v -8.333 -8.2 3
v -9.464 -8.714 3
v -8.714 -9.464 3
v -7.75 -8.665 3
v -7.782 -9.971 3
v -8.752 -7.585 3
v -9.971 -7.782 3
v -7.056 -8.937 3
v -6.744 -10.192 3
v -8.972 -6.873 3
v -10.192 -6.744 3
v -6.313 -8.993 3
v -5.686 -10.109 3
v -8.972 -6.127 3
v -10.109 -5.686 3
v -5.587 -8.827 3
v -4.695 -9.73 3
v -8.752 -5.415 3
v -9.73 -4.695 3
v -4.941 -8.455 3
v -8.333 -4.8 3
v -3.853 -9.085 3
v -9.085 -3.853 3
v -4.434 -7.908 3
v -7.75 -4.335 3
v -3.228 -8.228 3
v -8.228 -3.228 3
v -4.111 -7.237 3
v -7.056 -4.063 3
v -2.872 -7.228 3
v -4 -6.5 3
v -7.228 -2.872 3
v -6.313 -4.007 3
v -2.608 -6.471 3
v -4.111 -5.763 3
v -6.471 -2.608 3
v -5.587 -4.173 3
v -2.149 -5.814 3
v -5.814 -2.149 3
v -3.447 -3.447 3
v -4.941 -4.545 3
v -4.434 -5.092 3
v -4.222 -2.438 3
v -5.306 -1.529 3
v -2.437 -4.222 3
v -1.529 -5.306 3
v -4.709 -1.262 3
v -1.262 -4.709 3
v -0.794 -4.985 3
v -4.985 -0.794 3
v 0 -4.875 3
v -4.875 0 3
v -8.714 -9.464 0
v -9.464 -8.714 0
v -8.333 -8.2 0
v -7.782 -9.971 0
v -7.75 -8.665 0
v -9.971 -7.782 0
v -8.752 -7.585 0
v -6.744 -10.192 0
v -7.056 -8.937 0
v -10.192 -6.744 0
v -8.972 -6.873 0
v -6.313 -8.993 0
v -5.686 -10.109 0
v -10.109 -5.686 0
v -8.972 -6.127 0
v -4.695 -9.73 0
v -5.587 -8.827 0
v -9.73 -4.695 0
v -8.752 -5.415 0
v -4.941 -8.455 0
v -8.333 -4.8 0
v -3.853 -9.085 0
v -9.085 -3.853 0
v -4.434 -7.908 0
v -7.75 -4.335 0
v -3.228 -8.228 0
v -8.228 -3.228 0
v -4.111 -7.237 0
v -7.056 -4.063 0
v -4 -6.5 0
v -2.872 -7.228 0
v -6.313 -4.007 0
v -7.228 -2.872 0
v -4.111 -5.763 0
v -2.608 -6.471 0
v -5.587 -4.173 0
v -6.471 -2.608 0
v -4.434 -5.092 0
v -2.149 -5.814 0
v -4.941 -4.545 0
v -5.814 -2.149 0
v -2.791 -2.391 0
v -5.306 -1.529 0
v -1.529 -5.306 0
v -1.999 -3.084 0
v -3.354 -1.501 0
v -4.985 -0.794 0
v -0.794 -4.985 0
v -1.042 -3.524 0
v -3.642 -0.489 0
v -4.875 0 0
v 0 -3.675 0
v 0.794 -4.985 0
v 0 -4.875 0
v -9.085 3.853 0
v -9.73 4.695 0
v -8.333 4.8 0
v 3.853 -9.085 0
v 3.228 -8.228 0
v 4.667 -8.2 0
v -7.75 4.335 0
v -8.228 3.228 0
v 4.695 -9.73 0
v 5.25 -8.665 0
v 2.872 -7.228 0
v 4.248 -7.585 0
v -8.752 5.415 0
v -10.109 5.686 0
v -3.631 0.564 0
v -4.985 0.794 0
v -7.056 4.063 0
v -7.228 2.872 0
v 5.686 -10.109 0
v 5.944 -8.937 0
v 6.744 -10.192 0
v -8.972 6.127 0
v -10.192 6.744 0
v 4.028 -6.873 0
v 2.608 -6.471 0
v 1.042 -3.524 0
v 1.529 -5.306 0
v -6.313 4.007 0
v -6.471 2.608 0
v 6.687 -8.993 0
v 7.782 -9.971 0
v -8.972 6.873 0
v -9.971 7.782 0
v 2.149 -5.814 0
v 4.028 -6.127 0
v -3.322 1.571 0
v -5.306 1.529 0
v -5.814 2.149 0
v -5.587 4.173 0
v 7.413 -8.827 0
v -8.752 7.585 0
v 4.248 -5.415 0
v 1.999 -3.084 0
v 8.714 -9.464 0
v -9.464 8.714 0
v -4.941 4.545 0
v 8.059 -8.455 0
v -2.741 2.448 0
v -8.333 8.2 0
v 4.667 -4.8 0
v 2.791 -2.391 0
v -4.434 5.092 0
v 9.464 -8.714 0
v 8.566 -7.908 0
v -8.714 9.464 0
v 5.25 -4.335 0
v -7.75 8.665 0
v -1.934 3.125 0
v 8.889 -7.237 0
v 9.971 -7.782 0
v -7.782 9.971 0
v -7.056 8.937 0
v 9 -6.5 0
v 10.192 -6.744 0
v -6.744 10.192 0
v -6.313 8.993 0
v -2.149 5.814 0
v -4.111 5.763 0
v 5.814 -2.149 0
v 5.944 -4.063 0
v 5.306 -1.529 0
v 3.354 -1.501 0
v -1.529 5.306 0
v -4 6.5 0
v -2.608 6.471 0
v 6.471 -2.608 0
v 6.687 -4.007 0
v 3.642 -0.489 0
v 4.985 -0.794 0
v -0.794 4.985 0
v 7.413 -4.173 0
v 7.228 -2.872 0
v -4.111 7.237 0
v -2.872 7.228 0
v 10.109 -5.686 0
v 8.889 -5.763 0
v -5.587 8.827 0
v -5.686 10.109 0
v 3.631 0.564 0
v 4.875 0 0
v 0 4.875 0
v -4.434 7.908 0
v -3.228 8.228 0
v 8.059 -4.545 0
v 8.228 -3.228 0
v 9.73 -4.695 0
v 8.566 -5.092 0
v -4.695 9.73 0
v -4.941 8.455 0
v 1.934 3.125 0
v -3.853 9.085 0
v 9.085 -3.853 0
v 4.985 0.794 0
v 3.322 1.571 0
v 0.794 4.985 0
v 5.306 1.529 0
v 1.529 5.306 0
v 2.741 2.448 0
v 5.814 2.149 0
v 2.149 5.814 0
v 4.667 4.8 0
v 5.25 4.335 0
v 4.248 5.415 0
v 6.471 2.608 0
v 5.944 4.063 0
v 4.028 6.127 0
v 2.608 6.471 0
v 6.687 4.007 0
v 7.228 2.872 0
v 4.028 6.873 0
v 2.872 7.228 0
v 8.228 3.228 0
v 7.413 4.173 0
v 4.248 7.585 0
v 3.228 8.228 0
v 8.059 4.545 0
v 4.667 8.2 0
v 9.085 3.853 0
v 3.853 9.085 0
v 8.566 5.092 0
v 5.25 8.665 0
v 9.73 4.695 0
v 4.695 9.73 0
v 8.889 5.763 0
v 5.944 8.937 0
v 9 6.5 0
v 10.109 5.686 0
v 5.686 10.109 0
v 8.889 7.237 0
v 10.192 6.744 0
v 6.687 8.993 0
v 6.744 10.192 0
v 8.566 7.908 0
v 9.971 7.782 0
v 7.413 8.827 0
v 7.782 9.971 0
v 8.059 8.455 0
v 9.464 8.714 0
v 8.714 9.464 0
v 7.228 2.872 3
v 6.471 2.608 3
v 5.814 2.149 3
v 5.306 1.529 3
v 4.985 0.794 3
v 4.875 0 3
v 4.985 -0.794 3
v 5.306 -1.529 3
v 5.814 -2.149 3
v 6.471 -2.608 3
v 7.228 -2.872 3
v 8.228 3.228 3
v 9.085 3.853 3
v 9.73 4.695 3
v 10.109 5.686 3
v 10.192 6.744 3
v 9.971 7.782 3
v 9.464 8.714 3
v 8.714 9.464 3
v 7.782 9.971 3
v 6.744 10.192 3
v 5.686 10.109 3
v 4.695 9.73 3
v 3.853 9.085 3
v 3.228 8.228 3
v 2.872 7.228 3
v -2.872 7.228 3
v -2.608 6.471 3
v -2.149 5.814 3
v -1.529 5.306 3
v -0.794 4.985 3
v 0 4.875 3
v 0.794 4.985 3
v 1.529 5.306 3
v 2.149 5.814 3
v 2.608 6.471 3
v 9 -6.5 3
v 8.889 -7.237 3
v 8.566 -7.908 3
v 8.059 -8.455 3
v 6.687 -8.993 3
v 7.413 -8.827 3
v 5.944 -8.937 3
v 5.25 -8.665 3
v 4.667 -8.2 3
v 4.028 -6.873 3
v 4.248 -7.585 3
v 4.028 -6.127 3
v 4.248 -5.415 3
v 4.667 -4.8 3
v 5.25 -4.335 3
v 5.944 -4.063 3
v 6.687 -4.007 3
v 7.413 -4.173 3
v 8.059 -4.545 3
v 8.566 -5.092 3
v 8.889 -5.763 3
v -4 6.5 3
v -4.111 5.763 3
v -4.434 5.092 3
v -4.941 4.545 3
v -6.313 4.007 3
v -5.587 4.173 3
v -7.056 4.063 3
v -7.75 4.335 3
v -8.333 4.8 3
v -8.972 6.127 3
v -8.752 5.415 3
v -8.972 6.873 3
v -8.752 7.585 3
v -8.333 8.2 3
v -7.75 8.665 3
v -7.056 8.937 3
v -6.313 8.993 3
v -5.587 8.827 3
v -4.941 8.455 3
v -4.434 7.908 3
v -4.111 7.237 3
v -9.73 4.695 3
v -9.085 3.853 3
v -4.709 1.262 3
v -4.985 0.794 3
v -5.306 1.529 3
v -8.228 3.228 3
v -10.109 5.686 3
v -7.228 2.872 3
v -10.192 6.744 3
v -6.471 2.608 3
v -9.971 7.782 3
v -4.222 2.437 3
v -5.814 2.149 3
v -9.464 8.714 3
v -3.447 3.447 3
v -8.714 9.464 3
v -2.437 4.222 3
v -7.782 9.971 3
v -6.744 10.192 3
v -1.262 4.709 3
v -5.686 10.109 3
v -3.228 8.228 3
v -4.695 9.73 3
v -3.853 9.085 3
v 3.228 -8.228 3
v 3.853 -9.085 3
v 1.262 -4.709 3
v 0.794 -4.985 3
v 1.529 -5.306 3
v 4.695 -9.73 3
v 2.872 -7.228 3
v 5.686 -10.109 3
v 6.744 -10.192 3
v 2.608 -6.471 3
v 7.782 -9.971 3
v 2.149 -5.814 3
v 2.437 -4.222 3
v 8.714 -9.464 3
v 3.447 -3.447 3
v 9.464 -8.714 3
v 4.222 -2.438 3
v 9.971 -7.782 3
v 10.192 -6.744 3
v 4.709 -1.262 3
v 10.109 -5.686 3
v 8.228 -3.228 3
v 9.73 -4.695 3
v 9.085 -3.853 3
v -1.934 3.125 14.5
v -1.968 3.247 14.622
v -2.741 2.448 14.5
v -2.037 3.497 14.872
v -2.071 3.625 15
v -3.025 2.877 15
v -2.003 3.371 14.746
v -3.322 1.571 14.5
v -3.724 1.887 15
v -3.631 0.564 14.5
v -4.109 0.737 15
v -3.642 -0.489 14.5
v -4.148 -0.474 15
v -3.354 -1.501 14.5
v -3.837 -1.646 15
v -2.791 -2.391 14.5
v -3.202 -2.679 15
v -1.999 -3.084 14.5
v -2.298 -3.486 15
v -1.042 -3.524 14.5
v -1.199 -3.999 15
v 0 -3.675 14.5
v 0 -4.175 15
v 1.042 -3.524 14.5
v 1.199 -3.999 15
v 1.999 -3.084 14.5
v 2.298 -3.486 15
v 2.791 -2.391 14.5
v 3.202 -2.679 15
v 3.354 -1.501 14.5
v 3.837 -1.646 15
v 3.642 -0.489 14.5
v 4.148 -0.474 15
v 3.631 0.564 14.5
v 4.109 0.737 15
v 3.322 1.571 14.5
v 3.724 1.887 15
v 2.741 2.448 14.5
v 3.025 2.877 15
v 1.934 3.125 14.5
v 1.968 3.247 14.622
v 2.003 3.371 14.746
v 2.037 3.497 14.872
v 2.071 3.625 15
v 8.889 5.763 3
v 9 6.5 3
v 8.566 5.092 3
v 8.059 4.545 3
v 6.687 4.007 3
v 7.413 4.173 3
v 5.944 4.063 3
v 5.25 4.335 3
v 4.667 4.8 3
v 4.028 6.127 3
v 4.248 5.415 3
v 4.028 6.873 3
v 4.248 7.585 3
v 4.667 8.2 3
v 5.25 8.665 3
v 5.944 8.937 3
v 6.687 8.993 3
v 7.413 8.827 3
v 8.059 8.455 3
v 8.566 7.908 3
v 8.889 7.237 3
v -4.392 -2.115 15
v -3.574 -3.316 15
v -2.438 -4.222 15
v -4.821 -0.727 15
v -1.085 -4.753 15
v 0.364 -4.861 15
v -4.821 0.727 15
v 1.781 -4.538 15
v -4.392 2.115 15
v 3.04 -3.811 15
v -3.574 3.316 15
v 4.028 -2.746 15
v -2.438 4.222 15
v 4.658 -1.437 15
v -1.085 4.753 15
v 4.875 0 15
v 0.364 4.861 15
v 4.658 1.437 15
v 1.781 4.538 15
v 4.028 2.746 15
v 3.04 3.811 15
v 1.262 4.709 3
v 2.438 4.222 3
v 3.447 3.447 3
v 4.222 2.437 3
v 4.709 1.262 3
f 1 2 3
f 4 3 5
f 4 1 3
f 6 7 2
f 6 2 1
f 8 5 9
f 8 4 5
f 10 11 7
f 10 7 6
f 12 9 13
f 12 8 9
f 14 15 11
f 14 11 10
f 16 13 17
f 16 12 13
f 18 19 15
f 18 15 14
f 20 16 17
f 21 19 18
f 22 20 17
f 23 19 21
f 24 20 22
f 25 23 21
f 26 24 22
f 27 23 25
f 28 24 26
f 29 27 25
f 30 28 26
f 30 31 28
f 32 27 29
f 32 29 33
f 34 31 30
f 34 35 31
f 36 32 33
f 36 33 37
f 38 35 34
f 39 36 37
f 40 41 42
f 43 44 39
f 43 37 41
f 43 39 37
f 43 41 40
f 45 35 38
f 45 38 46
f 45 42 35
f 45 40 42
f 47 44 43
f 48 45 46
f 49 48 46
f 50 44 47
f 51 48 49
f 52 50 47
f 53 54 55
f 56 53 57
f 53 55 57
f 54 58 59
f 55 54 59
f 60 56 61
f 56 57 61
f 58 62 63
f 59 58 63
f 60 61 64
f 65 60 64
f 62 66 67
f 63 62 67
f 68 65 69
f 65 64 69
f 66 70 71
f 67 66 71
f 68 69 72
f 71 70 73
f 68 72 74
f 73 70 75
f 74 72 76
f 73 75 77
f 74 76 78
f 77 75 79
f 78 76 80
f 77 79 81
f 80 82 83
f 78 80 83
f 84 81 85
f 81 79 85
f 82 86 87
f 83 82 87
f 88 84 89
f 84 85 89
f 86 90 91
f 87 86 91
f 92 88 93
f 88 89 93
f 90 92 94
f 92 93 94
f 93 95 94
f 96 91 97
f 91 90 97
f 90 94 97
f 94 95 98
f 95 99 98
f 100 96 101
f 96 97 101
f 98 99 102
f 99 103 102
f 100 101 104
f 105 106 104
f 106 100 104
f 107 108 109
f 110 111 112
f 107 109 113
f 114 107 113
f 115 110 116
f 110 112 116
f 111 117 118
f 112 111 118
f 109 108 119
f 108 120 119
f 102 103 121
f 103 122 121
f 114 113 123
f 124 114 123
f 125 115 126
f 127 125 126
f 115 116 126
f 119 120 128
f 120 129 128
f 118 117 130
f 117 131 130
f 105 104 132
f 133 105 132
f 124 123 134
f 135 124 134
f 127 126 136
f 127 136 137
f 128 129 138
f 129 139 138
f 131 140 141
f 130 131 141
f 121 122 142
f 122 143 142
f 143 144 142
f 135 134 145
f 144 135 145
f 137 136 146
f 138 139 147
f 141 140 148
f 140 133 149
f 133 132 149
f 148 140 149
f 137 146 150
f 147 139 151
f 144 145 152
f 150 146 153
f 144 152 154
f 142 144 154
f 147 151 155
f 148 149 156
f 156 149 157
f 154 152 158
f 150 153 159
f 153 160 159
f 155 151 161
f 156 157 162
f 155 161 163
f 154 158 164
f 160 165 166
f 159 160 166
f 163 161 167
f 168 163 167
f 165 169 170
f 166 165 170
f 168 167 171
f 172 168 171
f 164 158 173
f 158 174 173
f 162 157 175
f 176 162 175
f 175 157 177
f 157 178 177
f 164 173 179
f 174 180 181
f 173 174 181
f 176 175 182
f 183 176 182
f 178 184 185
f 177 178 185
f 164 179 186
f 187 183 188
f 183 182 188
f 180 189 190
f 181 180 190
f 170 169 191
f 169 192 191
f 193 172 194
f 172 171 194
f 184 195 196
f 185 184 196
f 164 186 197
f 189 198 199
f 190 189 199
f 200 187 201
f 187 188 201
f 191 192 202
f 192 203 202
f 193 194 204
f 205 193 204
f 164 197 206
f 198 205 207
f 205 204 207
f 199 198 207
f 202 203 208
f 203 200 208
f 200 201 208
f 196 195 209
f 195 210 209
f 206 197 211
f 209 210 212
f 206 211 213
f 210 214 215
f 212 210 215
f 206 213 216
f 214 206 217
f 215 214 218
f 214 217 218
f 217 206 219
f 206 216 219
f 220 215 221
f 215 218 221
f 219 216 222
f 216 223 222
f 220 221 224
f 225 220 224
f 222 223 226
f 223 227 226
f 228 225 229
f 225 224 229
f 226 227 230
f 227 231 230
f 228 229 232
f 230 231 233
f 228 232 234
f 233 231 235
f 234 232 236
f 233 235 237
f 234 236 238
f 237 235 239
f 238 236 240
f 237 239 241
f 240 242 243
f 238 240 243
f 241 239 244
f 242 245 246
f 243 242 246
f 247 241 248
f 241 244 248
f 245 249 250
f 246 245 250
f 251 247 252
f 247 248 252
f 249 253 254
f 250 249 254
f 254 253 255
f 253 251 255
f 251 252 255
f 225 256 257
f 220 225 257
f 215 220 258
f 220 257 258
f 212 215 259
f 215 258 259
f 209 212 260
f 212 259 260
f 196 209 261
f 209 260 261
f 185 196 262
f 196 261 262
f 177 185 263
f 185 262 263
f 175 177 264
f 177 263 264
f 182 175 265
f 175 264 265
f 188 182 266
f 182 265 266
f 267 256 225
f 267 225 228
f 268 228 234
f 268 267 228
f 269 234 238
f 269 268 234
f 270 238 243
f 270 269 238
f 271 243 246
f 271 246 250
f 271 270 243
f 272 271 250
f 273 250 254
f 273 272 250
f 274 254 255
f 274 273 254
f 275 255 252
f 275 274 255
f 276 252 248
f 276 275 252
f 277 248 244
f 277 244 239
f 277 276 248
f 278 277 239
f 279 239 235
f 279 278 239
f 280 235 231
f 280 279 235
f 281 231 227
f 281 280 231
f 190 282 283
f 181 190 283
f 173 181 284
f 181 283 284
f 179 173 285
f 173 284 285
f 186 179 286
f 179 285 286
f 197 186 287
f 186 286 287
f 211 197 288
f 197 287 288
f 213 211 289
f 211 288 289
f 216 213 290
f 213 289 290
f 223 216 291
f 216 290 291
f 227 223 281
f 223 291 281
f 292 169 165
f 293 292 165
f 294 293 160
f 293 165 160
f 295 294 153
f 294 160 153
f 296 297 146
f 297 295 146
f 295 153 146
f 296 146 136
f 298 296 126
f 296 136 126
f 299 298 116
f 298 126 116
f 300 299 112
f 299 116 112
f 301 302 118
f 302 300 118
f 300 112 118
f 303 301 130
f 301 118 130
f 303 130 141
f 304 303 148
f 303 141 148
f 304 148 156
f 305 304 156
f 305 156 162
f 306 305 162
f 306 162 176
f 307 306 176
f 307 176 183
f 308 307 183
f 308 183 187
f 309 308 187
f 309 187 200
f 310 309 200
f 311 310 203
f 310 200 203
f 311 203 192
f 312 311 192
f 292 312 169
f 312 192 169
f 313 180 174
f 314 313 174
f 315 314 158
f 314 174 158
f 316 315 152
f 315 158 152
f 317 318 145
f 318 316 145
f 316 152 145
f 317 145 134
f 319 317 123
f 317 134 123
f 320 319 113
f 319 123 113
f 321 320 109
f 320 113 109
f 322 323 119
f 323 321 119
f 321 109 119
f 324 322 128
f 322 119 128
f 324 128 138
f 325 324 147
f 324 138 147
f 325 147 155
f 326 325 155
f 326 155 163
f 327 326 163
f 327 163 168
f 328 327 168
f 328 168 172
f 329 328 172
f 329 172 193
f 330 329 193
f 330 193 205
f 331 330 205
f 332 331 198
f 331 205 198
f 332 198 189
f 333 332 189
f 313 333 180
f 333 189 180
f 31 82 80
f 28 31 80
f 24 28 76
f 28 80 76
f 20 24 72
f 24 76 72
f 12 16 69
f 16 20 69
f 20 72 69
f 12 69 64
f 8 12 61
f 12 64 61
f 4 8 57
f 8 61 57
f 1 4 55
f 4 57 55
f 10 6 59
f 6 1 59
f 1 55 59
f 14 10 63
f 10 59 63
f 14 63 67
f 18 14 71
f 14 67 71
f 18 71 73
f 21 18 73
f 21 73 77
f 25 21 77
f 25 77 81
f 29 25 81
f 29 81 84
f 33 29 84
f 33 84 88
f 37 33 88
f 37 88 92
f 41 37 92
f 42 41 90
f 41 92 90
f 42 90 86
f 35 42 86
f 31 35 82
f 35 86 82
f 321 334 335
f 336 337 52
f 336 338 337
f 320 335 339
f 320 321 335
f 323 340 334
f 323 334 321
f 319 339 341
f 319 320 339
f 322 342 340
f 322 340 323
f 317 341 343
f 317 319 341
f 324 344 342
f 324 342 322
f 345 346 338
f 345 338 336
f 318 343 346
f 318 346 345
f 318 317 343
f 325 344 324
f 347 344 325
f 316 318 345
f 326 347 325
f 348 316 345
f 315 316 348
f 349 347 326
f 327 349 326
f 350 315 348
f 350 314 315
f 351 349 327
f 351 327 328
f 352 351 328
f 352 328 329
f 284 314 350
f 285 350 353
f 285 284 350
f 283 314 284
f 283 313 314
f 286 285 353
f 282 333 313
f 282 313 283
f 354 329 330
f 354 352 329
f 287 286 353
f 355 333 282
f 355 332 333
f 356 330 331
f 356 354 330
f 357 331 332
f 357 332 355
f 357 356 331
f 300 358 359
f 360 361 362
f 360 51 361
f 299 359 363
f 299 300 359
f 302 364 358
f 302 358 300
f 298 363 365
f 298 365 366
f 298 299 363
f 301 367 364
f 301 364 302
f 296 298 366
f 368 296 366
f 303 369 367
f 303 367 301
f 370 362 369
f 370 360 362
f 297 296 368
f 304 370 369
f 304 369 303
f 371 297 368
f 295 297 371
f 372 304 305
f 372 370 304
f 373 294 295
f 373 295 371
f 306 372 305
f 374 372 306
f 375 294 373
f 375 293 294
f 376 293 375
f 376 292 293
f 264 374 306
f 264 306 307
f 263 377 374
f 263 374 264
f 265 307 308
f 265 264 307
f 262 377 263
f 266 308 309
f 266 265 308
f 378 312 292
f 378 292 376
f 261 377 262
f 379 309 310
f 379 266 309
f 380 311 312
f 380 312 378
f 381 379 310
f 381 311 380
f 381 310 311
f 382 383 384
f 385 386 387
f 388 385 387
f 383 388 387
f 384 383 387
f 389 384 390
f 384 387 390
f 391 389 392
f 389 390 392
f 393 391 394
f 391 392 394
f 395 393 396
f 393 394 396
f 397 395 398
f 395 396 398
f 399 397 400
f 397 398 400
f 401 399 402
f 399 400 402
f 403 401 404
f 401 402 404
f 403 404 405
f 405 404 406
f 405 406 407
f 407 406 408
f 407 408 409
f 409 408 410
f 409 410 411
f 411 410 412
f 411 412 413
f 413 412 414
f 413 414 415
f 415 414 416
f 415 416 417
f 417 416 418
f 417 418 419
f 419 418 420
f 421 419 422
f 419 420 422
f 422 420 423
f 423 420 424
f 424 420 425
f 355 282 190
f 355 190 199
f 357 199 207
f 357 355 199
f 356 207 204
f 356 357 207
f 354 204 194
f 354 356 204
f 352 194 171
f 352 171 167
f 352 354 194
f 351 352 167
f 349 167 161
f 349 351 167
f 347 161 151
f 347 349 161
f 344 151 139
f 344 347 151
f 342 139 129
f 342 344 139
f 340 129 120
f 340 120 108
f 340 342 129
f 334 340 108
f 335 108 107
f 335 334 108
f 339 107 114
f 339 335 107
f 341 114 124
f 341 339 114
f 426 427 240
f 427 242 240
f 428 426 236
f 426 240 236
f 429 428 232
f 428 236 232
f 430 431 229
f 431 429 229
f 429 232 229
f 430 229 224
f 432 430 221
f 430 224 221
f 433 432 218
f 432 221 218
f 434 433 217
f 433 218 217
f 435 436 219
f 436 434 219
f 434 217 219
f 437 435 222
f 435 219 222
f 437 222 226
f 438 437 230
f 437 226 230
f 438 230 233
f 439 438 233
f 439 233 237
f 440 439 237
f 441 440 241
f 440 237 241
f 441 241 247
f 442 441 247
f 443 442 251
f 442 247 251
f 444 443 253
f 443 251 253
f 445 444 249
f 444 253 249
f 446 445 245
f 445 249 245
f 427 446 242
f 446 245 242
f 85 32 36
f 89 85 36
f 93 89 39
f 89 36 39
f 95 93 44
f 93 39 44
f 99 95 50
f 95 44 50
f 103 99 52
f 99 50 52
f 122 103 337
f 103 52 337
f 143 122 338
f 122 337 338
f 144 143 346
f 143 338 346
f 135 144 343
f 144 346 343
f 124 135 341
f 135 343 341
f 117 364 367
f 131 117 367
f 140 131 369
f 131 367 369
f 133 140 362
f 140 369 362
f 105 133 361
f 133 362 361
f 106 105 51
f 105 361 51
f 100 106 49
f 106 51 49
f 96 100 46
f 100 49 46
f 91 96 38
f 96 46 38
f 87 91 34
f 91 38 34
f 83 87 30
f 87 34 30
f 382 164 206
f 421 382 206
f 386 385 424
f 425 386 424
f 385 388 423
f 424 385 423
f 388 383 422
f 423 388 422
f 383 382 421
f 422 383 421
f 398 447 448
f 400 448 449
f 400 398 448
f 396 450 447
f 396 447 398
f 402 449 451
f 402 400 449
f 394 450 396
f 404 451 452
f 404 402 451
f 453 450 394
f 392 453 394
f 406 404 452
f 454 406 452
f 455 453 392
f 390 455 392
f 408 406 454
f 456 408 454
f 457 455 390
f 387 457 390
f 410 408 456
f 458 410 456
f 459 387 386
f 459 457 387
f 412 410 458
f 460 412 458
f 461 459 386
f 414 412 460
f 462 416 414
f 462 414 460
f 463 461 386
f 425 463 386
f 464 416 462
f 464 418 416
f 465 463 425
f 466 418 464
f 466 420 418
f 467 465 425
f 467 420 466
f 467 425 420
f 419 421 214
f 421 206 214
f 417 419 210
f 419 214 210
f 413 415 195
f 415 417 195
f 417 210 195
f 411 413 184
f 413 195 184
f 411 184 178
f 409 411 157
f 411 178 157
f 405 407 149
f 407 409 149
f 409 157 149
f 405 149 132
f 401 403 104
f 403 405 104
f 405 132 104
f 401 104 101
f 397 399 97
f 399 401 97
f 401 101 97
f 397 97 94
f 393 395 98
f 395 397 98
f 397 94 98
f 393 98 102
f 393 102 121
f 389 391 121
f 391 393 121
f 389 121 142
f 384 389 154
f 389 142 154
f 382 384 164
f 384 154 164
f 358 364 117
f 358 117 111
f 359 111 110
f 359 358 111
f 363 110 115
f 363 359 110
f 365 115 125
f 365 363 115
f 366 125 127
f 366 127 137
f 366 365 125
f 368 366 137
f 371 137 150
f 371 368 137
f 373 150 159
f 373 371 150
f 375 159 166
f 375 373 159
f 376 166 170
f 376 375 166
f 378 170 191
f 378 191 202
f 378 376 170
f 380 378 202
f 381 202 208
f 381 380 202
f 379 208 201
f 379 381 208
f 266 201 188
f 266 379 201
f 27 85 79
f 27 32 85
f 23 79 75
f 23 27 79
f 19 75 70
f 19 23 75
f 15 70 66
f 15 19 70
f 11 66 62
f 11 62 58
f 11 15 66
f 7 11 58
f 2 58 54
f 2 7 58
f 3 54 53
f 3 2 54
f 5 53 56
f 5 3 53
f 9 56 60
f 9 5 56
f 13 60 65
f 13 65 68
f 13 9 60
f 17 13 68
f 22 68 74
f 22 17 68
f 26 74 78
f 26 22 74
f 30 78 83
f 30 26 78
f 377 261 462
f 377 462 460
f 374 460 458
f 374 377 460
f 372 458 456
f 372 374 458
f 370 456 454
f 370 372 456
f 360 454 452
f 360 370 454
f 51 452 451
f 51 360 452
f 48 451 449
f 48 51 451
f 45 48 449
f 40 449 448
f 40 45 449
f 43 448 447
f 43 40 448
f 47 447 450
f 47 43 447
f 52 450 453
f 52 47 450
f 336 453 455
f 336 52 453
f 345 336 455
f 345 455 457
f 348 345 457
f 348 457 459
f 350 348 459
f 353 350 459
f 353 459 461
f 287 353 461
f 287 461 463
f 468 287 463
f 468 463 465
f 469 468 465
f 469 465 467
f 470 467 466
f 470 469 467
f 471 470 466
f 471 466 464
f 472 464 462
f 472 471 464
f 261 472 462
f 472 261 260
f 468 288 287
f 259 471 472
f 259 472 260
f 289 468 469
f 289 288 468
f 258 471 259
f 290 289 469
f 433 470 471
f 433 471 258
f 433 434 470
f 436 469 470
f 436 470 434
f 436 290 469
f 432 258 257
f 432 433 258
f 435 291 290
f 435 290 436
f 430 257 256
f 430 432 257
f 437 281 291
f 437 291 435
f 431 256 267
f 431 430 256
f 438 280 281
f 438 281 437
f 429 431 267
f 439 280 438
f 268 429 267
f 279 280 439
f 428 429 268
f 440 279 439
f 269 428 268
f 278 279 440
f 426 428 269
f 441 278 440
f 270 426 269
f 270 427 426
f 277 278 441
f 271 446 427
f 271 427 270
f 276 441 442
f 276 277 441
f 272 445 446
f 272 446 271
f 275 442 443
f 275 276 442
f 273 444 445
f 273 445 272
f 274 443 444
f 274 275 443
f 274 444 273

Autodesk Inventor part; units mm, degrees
ref_plane "YZ Plane" through (0, 0, 0) normal (1, 0, 0) x (0, 1, 0)
ref_plane "XZ Plane" through (0, 0, 0) normal (0, 1, 0) x (-1, 0, 0)
ref_plane "XY Plane" through (0, 0, 0) normal (0, 0, 1) x (1, 0, 0)
sketch "Sketch1" plane through (0, 0, 0) normal (0, 0, 1) x (1, 0, 0)
  line L0 (-12.5, 12.5) -> (12.5, 12.5)
  line L1 (12.5, 12.5) -> (12.5, -12.5)
  line L2 (12.5, -12.5) -> (-12.5, -12.5)
  line L3 (-12.5, -12.5) -> (-12.5, 12.5)
  line L4 (-12.5, 12.5) -> (12.5, -12.5) construction
  line L5 (-12.5, -12.5) -> (12.5, 12.5) construction
  arc A0 (-1.7861, 2.625) -> (1.7861, 2.625) centre (0, 0) ccw
  line L6 (-1.7861, 2.625) -> (1.7861, 2.625)
  circle A1 centre (-6.5, 6.5) radius 2.5
  circle A2 centre (6.5, 6.5) radius 2.5
  circle A3 centre (6.5, -6.5) radius 2.5
  circle A4 centre (-6.5, -6.5) radius 2.5
  line L7 (1.9339, 3.125) -> (-1.9339, 3.125)
  arc A5 (-1.9339, 3.125) -> (1.9339, 3.125) centre (0, 0) ccw
  point P0 (0, 0)
  dimension "d0" = 6.35
  dimension "d1" = 25
  dimension "d2" = 5.8
  dimension "d3" = 5
  dimension "d6" = 13
  dimension "d7" = 0.5
extrude "Extrusion1" add sketch "Sketch1" along normal blind 3 contours L0 L1 L2 L3
sketch "Sketch2" plane through (0, 0, 3) normal (0, 0, 1) x (1, 0, 0)
  line L0 (12.5, 12.5) -> (-12.5, 12.5) projected
  line L1 (-12.5, 12.5) -> (-12.5, -12.5) projected
  line L2 (-12.5, -12.5) -> (12.5, -12.5) projected
  line L3 (12.5, -12.5) -> (12.5, 12.5) projected
  circle A0 centre (-6.5, 6.5) radius 2.5 projected
  circle A1 centre (6.5, 6.5) radius 2.5 projected
  circle A2 centre (6.5, -6.5) radius 2.5 projected
  circle A3 centre (-6.5, -6.5) radius 2.5 projected
  arc A4 (-1.9339, 3.125) -> (1.9339, 3.125) centre (0, 0) ccw projected
  line L4 (-1.9339, 3.125) -> (1.9339, 3.125) projected
  arc A5 (-2.8723, 7.2281) -> (-7.2281, 2.8723) centre (-6.5, 6.5) ccw
  arc A6 (-7.2281, -2.8723) -> (-2.8723, -7.2281) centre (-6.5, -6.5) ccw
  arc A7 (2.8723, -7.2281) -> (7.2281, -2.8723) centre (6.5, -6.5) ccw
  arc A8 (7.2281, 2.8723) -> (2.8723, 7.2281) centre (6.5, 6.5) ccw
  arc A9 (-7.2281, -2.8723) -> (-7.2281, 2.8723) centre (-7.8046, 0) ccw
  arc A10 (-2.8723, 7.2281) -> (2.8723, 7.2281) centre (0, 7.8046) ccw
  arc A11 (7.2281, 2.8723) -> (7.2281, -2.8723) centre (7.8046, 0) ccw
  arc A12 (2.8723, -7.2281) -> (-2.8723, -7.2281) centre (0, -7.8046) ccw
  point P0 (0, 0)
  dimension "d12" = 1.2
  dimension "d13" = 1.2
extrude "Extrusion2" cut sketch "Sketch2" against normal through all contours L3 L2 L1 L0
sketch "Sketch3" plane through (0, 0, 3) normal (0, 0, 1) x (1, 0, 0)
  arc A0 (-2.8723, 7.2281) -> (-7.2281, 2.8723) centre (-6.5, 6.5) ccw projected
  arc A1 (-7.2281, -2.8723) -> (-7.2281, 2.8723) centre (-7.8046, 0) ccw projected
  arc A2 (-7.2281, -2.8723) -> (-2.8723, -7.2281) centre (-6.5, -6.5) ccw projected
  arc A3 (2.8723, -7.2281) -> (-2.8723, -7.2281) centre (0, -7.8046) ccw projected
  arc A4 (2.8723, -7.2281) -> (7.2281, -2.8723) centre (6.5, -6.5) ccw projected
  arc A5 (7.2281, 2.8723) -> (7.2281, -2.8723) centre (7.8046, 0) ccw projected
  arc A6 (7.2281, 2.8723) -> (2.8723, 7.2281) centre (6.5, 6.5) ccw projected
  arc A7 (-2.8723, 7.2281) -> (2.8723, 7.2281) centre (0, 7.8046) ccw projected
  circle A8 centre (-6.5, 6.5) radius 2.5 projected
  circle A9 centre (6.5, 6.5) radius 2.5 projected
  circle A10 centre (6.5, -6.5) radius 2.5 projected
  circle A11 centre (-6.5, -6.5) radius 2.5 projected
  arc A12 (-1.9339, 3.125) -> (1.9339, 3.125) centre (0, 0) ccw projected
  line L0 (-1.9339, 3.125) -> (1.9339, 3.125) projected
  circle A13 centre (0, 0) radius 4.875
  arc A14 (-7.2281, -2.8723) -> (-7.2281, 2.8723) centre (-7.8046, 0) ccw projected
  point P0 (0, 0)
extrude "Extrusion3" add sketch "Sketch3" along normal blind 12 contours A13
chamfer "Chamfer1" distance 0.5 angle 45 2 edges at (0, 3.125, 15) (0, -3.675, 15)
properties part number "teenee_part"
